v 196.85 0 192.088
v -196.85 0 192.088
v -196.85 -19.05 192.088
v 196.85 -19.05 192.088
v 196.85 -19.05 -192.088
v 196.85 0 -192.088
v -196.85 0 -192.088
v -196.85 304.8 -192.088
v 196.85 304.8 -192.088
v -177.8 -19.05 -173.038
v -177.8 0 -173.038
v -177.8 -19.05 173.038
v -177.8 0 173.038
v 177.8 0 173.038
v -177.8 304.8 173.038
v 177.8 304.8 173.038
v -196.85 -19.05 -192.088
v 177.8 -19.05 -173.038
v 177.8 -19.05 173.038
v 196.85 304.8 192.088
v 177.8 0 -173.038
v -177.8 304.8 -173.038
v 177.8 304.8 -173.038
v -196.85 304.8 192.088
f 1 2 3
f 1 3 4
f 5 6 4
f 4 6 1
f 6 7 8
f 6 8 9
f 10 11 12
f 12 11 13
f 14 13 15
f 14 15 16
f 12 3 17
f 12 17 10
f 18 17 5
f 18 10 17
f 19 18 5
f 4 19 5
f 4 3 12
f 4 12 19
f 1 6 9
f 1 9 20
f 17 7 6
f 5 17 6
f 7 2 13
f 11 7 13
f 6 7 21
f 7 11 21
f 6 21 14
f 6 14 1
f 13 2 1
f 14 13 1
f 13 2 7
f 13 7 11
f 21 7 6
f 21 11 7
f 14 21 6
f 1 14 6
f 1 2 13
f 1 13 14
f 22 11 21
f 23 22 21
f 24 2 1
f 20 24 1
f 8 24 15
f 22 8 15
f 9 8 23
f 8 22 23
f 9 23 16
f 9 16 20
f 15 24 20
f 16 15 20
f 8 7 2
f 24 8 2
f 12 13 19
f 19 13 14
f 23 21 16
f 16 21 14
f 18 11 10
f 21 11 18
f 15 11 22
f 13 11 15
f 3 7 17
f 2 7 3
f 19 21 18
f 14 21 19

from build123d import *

# Parameters (mm, degrees)
F0_W     = 393.7
F0_H     = 384.175
F0_W_2   = 355.6
F0_H_2   = 346.075
F1_DEPTH = 304.8
F2_W     = 393.7
F2_H     = 384.175
F2_W_2   = 355.6
F2_H_2   = 346.075
F3_DEPTH = 19.05


with BuildPart() as f1:
    # F0 (on Front) → F1 (new body)
    with BuildSketch(Plane.XZ):
        Rectangle(F0_W, F0_H)
        Rectangle(F0_W_2, F0_H_2, mode=Mode.SUBTRACT)
    extrude(amount=-F1_DEPTH)


with BuildPart() as f3:
    # F2 (on face) → F3 (new body)
    with BuildSketch(Plane.XZ):
        Rectangle(F2_W, F2_H)
        Rectangle(F2_W_2, F2_H_2, mode=Mode.SUBTRACT)
    extrude(amount=F3_DEPTH)


solid = Compound([f1.part, f3.part])
